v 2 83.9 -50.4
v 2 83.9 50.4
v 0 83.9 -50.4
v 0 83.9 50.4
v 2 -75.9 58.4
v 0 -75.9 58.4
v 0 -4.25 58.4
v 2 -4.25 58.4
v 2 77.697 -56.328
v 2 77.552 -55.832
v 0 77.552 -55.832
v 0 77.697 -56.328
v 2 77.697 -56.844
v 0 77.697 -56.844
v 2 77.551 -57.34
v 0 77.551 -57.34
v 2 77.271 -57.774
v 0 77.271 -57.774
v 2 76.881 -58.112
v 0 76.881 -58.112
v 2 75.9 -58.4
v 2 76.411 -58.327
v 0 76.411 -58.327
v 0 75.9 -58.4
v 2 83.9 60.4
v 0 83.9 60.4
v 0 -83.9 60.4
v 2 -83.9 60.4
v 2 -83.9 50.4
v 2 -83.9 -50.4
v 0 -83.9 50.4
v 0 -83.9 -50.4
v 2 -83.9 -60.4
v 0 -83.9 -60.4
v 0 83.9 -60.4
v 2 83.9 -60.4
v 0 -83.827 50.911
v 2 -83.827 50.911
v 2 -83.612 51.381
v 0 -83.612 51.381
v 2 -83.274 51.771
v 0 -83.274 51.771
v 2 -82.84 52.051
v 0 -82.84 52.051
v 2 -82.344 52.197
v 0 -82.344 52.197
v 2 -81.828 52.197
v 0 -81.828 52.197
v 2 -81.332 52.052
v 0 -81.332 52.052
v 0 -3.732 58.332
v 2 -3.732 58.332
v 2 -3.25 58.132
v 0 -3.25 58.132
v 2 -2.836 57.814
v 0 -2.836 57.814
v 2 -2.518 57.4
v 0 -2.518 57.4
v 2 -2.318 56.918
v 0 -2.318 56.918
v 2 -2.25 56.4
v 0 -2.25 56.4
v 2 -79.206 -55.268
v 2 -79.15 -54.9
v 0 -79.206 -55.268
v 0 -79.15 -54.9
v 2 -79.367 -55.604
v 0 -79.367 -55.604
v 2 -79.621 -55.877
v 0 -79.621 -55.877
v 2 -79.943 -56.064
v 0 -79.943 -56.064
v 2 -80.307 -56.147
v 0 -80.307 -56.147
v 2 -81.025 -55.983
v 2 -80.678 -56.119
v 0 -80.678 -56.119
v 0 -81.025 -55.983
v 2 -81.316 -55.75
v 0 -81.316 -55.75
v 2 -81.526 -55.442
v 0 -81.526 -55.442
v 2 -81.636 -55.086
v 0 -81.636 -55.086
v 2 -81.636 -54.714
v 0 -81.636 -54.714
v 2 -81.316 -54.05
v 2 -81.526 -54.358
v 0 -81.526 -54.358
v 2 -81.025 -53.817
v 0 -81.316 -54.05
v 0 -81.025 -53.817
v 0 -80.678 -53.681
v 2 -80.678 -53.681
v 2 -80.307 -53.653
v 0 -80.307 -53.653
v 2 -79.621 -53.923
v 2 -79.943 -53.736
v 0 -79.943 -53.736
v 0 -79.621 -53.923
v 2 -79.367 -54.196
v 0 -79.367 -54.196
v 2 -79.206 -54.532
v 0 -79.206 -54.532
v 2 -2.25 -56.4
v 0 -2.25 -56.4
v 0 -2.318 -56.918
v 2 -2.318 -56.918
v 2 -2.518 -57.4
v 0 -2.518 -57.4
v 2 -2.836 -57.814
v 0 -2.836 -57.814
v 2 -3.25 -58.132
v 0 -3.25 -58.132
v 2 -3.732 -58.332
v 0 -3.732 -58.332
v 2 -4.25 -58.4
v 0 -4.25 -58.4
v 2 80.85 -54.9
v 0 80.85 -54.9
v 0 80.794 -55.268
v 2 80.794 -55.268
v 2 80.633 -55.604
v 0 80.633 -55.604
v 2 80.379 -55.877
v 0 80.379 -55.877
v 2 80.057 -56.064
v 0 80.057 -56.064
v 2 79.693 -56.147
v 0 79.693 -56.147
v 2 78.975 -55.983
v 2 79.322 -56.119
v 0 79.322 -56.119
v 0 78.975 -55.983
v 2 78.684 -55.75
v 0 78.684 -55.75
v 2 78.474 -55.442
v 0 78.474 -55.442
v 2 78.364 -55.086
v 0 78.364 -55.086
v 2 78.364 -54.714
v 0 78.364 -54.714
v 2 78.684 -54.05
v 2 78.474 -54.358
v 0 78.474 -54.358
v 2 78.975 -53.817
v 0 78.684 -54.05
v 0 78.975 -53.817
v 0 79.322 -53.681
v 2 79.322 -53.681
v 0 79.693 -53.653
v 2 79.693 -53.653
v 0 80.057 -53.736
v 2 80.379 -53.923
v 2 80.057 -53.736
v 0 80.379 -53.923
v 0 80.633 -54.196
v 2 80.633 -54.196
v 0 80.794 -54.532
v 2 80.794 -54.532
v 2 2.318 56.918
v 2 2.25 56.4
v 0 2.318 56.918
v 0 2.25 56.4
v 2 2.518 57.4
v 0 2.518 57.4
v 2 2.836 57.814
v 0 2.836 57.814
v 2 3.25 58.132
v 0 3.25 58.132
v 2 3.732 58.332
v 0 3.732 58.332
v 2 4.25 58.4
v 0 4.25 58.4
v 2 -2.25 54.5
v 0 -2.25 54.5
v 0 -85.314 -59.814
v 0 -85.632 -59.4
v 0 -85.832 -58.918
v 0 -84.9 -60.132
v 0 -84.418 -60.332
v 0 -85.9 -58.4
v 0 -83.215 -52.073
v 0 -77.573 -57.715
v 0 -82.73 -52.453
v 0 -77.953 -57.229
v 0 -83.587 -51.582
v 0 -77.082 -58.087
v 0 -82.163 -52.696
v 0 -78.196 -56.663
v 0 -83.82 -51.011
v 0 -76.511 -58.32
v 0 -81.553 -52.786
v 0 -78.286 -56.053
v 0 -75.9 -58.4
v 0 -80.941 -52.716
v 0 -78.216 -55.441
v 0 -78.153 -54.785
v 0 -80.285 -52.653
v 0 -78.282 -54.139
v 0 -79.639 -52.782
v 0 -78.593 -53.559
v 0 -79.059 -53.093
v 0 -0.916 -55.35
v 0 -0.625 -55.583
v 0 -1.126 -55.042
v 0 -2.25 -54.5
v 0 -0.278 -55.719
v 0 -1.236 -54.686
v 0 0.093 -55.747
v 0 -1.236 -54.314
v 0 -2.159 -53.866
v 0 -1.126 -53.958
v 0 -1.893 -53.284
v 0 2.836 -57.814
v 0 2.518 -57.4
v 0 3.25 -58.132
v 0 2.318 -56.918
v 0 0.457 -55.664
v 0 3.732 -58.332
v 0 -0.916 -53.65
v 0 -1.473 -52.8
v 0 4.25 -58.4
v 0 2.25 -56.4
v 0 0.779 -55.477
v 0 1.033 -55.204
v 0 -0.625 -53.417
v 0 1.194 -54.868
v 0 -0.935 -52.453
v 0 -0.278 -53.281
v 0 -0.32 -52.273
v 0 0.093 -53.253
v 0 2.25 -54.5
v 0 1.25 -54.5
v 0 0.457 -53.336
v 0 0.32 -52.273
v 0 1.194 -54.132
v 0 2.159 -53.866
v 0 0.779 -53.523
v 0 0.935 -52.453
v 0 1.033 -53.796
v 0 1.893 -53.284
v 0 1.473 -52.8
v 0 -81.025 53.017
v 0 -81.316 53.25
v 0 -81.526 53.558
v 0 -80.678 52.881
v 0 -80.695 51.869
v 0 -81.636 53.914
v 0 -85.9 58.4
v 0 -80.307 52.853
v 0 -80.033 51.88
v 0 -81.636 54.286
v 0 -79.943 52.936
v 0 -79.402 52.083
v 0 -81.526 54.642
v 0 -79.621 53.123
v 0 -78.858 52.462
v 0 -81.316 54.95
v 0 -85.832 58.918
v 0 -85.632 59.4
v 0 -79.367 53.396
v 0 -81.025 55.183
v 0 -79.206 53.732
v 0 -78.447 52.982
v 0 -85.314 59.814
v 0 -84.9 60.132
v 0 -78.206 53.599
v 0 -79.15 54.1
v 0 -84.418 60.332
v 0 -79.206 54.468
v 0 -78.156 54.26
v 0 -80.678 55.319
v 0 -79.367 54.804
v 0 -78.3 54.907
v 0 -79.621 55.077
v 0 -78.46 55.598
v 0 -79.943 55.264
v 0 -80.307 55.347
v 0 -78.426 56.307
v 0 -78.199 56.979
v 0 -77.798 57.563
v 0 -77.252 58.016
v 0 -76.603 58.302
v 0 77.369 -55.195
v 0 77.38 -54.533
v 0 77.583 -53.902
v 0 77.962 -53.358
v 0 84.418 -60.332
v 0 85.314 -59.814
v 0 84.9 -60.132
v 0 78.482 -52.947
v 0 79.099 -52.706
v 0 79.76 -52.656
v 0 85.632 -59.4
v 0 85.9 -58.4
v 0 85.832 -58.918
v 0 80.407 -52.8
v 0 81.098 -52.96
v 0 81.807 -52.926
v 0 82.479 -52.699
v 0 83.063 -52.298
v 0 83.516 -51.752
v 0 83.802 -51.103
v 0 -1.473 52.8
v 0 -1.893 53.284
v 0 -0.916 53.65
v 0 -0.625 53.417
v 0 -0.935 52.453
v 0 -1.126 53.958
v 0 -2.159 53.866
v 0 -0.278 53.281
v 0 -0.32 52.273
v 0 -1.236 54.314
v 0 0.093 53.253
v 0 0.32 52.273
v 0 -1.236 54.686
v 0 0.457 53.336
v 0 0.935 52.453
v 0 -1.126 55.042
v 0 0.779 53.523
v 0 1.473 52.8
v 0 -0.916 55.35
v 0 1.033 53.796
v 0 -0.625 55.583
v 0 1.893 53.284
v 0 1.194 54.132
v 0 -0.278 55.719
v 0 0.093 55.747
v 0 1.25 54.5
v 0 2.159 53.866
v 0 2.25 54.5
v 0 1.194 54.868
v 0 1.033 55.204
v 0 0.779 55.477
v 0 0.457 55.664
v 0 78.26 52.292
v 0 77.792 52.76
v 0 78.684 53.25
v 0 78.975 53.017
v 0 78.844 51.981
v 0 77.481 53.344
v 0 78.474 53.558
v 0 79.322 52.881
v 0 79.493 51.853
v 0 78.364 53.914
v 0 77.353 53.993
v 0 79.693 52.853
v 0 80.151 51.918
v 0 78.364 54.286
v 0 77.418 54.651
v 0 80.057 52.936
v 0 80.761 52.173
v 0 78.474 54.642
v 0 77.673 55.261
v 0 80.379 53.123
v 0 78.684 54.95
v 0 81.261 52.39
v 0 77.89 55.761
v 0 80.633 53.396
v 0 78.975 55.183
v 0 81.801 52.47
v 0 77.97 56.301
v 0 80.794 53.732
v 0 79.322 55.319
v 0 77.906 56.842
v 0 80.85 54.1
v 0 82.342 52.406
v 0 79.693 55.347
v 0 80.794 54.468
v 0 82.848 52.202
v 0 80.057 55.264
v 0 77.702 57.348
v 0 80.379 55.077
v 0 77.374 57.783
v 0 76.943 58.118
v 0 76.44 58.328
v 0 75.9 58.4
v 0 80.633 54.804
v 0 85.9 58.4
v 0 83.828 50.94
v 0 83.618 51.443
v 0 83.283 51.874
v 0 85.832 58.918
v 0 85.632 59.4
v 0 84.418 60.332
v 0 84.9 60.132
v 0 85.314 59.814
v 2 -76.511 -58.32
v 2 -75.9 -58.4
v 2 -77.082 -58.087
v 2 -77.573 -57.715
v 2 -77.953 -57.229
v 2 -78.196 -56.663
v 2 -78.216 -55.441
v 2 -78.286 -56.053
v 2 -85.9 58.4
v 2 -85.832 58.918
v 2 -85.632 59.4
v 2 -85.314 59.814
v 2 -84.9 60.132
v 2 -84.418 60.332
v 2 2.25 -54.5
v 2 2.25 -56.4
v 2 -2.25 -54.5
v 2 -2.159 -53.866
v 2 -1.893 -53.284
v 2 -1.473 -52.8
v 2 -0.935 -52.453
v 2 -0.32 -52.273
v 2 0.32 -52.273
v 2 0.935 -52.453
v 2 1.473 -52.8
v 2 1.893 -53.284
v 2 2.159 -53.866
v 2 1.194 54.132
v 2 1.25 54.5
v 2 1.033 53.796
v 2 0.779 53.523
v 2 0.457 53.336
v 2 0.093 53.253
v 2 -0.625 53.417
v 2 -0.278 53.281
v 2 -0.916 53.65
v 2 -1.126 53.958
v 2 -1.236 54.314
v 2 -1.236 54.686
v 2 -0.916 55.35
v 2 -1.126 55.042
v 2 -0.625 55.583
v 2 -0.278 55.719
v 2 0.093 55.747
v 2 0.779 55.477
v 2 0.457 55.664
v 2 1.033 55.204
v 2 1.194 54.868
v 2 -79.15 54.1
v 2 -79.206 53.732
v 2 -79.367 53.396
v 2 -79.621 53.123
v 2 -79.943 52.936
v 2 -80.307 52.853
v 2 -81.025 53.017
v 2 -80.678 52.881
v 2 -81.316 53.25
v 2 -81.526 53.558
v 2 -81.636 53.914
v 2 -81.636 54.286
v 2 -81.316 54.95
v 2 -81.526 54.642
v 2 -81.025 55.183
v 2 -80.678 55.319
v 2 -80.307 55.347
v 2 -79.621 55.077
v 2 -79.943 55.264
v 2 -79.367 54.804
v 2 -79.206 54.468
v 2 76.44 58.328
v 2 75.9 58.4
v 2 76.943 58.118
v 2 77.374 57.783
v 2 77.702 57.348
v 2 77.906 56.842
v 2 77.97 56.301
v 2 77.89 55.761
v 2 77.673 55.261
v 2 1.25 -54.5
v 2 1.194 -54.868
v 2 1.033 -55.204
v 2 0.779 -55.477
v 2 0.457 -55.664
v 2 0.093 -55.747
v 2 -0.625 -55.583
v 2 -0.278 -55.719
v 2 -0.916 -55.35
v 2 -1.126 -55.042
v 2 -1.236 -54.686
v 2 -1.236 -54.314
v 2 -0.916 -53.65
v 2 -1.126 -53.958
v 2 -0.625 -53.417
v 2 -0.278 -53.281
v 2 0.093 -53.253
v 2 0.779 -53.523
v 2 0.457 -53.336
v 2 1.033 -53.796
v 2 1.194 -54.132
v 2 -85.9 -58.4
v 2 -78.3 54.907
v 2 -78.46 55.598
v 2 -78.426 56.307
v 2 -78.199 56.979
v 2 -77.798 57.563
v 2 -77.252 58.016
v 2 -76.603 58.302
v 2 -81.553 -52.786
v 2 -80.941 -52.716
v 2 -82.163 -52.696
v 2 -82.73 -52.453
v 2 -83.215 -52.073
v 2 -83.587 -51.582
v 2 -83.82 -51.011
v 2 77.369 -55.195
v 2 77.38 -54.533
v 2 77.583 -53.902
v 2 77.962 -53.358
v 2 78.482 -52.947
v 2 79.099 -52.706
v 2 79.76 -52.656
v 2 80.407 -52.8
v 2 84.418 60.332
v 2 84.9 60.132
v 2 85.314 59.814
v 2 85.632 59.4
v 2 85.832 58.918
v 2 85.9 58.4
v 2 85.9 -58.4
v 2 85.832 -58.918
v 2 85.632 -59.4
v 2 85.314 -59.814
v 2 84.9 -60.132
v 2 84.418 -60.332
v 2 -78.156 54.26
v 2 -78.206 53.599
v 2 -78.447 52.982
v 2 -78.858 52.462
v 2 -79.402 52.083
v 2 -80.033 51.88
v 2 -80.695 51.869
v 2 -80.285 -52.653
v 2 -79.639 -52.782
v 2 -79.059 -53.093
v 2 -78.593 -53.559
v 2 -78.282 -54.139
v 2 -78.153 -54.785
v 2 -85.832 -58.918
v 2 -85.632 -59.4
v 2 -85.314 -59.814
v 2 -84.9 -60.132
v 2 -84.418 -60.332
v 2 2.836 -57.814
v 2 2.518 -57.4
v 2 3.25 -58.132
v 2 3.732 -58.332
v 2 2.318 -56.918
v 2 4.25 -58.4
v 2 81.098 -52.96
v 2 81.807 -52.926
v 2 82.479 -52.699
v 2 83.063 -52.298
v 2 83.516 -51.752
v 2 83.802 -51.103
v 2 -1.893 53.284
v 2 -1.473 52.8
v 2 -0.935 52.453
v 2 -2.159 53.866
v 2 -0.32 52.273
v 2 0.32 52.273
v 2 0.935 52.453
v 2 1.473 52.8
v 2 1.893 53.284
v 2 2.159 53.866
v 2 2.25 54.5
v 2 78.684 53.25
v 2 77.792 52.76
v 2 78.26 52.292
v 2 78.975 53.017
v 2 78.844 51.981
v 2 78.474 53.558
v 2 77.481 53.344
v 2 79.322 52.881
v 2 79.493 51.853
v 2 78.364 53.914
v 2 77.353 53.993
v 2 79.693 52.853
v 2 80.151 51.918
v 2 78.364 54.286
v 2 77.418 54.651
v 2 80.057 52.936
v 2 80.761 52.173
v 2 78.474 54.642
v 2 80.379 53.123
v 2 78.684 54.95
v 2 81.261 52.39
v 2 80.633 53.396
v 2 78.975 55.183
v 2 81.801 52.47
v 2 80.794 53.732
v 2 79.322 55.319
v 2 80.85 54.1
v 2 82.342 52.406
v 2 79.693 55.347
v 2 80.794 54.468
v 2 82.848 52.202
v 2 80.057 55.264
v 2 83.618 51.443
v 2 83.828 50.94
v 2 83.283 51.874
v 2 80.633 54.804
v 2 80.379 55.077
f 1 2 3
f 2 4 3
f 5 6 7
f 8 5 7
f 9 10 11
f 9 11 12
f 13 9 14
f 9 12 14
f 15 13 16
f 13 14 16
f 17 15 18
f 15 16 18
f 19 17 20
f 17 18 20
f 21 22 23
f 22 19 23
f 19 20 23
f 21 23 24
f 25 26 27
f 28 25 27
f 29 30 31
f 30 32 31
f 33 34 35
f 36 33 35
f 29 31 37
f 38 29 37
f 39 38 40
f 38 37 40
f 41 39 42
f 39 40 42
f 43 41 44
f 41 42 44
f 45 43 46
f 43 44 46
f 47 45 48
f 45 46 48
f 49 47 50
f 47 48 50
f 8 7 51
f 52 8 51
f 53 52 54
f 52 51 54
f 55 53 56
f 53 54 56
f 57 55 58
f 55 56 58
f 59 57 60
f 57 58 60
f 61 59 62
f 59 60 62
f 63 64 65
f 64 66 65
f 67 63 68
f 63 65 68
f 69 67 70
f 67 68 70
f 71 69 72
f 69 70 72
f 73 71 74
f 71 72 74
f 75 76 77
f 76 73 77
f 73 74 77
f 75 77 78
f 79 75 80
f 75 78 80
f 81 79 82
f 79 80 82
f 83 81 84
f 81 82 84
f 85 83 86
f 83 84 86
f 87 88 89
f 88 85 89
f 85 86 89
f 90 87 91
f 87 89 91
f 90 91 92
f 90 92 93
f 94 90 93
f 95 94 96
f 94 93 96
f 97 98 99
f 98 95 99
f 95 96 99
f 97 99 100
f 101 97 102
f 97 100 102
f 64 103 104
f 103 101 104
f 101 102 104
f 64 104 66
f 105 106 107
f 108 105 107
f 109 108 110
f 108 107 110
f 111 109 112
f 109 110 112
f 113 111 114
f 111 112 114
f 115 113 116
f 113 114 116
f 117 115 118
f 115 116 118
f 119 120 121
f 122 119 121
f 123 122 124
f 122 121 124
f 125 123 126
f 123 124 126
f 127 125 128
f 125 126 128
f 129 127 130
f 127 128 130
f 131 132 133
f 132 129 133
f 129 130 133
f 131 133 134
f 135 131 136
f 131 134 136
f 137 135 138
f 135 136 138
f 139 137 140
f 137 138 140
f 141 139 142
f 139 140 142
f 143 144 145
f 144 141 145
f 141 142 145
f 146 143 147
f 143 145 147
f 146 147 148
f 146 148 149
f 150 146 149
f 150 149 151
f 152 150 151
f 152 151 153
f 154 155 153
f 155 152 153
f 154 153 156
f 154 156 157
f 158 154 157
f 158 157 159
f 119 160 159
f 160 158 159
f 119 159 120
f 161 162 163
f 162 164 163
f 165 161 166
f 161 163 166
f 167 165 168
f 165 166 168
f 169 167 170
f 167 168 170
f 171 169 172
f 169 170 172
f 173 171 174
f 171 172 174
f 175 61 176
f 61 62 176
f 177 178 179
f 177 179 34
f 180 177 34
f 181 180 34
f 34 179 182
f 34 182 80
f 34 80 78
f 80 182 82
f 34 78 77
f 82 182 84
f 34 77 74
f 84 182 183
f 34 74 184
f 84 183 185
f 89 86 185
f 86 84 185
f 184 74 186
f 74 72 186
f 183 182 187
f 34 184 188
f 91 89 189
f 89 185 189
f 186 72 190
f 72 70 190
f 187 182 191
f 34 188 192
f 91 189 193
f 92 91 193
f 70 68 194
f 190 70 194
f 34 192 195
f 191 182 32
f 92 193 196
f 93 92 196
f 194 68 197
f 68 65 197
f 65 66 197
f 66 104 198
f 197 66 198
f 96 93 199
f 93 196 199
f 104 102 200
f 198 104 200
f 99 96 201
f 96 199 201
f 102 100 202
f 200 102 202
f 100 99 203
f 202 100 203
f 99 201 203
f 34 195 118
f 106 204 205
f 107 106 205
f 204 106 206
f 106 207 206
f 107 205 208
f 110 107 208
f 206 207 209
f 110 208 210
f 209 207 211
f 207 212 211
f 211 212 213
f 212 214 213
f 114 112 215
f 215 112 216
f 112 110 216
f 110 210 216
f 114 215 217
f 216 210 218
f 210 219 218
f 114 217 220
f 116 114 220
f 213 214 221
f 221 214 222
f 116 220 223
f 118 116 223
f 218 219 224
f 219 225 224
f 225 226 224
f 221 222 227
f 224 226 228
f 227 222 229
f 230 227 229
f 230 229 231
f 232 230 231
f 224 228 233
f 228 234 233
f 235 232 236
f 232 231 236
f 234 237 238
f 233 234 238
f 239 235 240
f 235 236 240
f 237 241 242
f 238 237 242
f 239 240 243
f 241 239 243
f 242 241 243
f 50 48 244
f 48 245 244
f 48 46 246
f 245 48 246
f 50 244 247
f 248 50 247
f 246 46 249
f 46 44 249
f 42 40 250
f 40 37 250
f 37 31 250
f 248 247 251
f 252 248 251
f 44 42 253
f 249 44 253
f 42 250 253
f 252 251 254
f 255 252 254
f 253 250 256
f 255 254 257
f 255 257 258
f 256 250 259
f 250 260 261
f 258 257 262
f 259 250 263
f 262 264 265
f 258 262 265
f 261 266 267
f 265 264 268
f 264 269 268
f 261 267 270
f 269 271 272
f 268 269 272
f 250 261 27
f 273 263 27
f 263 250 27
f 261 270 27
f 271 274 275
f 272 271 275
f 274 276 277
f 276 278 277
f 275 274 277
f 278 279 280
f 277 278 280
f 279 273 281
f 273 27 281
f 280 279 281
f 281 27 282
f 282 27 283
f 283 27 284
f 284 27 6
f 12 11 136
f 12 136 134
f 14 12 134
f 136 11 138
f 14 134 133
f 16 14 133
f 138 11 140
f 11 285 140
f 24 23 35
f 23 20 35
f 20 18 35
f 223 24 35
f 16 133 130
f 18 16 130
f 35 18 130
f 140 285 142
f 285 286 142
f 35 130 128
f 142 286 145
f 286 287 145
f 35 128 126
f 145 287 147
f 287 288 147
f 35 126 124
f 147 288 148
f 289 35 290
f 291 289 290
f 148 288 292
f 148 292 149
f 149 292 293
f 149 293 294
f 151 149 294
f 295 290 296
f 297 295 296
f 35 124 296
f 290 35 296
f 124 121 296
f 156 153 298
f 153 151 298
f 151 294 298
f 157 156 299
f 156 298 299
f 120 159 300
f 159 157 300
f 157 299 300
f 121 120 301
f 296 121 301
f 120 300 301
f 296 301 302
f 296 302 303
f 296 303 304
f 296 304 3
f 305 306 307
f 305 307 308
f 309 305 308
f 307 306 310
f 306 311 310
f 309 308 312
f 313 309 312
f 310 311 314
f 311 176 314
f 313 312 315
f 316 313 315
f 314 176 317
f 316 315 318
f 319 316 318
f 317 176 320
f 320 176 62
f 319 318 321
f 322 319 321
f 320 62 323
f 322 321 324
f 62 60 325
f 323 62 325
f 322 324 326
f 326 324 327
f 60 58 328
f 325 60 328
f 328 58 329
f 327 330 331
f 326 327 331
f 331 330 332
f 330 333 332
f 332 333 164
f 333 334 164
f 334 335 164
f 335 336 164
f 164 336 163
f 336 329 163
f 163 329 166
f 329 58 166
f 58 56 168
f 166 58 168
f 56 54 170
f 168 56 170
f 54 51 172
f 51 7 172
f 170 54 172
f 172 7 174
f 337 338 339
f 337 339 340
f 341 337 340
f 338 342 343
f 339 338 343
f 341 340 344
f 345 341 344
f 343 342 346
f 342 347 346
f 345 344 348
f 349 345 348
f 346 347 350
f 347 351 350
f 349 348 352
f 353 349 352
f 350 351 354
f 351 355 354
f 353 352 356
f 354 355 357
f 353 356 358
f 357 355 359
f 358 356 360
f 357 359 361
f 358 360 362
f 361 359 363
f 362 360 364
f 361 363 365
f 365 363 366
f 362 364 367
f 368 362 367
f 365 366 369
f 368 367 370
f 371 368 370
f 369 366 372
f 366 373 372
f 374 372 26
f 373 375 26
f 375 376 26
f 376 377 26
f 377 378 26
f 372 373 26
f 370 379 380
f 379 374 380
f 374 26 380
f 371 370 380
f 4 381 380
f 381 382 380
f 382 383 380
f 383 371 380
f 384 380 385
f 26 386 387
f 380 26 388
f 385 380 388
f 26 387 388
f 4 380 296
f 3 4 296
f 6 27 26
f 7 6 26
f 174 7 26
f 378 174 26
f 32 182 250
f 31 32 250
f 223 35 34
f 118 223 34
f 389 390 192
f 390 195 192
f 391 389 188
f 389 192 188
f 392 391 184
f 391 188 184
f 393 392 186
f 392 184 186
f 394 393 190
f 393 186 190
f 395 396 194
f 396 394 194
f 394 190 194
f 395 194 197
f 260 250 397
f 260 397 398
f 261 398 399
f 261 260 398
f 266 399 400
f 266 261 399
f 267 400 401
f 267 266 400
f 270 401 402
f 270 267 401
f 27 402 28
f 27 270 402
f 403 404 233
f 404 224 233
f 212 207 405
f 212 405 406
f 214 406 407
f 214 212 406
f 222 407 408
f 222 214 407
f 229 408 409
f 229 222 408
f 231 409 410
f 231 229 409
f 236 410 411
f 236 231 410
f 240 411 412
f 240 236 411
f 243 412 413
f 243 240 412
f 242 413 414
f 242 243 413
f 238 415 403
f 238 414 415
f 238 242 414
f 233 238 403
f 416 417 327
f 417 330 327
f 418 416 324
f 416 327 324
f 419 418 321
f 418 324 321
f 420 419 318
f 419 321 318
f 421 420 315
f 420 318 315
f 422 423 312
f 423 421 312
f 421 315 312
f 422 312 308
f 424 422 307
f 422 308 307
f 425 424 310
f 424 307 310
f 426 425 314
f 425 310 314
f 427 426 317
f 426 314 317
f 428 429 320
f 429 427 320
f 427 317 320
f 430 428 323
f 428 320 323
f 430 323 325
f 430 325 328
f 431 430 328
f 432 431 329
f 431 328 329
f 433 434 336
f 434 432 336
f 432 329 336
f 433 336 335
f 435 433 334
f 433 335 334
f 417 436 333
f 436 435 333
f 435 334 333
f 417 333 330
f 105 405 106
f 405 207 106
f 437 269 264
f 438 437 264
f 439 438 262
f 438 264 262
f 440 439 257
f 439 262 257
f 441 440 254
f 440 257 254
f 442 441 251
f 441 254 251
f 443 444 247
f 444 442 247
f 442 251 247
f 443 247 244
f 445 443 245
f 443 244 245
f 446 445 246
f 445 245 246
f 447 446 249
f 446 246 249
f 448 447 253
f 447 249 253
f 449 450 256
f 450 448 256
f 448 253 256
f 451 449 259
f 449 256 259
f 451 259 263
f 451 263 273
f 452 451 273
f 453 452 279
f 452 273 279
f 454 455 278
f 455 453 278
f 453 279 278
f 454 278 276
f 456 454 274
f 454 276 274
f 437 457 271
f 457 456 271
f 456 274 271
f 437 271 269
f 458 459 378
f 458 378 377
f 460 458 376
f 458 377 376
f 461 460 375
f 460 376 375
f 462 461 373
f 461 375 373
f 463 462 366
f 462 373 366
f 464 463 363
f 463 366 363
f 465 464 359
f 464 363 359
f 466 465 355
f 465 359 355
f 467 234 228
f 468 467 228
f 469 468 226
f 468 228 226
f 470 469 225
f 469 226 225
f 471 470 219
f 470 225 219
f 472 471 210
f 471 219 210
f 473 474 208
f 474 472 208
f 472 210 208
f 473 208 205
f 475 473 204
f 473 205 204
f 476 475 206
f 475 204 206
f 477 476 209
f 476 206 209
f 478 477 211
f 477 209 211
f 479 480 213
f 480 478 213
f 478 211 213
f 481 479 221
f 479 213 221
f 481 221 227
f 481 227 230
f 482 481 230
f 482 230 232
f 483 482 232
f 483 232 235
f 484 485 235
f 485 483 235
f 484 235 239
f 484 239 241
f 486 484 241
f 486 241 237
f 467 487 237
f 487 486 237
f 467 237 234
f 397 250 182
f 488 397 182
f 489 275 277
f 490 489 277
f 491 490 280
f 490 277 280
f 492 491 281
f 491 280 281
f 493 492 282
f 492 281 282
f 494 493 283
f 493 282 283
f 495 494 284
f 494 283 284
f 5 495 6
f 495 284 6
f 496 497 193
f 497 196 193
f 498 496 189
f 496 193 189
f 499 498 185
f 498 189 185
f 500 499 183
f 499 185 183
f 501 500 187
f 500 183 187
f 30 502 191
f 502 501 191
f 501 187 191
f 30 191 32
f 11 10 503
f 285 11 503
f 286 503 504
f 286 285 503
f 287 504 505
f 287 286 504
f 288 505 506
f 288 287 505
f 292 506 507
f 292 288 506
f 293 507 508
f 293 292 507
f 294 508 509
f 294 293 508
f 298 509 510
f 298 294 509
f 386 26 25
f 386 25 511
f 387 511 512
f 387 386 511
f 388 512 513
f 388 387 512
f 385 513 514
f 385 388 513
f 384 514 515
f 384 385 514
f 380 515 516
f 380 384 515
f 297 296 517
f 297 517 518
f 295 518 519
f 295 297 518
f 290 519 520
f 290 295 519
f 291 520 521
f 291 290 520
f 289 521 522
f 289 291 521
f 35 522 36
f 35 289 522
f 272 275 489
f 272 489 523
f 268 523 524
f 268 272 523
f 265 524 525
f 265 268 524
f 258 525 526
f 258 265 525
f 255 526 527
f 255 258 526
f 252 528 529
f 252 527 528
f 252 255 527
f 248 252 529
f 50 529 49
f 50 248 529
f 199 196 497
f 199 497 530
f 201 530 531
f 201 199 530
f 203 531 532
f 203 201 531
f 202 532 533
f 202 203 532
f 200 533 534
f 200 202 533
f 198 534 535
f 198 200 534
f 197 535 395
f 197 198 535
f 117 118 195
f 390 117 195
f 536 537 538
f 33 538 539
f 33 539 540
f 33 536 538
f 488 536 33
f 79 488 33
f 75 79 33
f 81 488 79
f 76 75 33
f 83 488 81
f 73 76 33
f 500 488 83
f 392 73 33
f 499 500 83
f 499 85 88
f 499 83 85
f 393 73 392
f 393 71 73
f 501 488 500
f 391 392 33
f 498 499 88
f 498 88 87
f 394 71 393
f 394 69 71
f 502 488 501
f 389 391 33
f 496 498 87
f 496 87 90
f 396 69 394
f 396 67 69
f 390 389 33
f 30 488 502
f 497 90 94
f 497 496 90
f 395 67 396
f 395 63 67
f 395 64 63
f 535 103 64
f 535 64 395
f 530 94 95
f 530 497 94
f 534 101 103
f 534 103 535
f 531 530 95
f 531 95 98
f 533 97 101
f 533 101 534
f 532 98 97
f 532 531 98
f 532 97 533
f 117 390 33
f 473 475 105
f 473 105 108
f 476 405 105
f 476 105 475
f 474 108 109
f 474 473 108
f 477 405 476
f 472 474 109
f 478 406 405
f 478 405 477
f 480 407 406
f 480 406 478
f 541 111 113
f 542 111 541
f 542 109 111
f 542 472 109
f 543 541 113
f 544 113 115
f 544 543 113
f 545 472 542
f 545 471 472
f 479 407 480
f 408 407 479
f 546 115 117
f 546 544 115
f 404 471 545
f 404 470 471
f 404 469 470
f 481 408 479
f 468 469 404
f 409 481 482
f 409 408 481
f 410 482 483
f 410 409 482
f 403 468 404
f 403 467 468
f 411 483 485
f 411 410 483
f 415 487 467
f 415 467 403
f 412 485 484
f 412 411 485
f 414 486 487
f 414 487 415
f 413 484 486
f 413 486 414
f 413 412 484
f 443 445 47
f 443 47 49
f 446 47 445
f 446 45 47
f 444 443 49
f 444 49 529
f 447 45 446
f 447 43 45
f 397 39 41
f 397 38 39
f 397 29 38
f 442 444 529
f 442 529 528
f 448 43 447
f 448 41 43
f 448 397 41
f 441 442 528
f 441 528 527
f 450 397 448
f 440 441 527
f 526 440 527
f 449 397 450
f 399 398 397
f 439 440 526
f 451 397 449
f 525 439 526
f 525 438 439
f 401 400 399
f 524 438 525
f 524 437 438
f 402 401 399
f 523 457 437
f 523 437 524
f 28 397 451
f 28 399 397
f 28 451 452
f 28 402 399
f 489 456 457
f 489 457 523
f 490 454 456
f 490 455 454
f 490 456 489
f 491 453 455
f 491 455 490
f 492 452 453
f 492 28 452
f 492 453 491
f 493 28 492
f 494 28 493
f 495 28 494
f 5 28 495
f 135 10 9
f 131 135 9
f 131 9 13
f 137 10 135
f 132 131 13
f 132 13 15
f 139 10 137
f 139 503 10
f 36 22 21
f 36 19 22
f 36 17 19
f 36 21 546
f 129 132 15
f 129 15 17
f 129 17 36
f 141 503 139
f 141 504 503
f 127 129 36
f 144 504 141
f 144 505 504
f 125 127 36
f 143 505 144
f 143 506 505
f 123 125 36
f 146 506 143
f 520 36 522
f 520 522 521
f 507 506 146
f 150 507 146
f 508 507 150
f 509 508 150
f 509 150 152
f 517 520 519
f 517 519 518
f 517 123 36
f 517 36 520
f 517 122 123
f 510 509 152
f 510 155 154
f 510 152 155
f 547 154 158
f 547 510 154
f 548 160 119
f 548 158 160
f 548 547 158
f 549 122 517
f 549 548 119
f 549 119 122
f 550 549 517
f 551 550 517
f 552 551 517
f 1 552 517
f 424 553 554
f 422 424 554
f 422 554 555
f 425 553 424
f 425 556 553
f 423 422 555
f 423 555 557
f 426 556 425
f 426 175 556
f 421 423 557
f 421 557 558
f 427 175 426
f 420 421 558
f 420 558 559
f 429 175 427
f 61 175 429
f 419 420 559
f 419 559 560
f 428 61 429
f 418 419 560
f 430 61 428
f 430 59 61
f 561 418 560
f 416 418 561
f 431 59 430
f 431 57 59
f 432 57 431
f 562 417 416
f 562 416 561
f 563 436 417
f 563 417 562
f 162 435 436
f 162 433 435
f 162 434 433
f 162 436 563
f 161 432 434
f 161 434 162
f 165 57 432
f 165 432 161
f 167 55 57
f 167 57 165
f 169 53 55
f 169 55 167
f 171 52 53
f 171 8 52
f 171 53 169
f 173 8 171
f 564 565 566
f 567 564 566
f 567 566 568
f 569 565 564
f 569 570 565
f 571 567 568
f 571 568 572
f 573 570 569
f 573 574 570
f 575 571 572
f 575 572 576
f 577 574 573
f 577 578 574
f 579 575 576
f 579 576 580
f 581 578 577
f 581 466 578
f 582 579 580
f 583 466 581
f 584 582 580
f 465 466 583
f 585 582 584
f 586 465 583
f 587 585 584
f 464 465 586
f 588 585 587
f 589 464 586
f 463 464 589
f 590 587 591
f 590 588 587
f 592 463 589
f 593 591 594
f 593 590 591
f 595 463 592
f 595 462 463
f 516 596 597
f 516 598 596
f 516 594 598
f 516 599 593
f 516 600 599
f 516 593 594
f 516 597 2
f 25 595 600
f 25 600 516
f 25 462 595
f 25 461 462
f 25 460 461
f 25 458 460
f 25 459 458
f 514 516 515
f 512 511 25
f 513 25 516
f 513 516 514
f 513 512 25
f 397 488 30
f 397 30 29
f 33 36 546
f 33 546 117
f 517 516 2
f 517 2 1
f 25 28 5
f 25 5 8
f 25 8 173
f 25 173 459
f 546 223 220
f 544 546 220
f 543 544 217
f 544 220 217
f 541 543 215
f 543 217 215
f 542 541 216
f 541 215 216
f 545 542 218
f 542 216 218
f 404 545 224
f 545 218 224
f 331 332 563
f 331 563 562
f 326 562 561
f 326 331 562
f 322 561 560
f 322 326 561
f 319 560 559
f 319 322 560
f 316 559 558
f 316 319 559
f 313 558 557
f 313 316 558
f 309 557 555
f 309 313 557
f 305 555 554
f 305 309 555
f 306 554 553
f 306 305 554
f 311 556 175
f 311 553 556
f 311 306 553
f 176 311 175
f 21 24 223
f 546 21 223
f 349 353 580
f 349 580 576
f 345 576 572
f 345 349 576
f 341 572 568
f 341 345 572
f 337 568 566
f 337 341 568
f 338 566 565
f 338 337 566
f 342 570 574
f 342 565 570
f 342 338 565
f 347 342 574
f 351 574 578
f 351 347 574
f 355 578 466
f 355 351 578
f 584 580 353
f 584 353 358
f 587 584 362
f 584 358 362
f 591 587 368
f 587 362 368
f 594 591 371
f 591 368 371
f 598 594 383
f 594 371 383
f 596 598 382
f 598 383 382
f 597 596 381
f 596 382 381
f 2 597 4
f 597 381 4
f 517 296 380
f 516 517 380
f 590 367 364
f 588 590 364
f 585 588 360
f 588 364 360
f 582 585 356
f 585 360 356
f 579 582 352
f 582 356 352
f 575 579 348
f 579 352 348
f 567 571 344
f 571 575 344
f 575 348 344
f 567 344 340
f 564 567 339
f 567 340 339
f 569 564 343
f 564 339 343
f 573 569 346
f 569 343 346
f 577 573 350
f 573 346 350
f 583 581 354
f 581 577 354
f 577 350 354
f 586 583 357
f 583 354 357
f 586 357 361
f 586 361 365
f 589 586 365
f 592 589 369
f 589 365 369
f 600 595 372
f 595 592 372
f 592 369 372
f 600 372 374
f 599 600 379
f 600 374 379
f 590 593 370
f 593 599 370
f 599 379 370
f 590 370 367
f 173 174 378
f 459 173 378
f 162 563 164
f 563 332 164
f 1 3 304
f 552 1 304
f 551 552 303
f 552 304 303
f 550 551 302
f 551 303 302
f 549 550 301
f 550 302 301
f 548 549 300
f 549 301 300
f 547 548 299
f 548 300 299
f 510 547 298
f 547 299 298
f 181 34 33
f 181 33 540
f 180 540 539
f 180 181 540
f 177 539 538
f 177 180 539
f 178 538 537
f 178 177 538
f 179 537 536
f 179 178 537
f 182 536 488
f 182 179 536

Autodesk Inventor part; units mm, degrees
ref_plane "YZ Plane" through (0, 0, 0) normal (1, 0, 0) x (0, 1, 0)
ref_plane "XZ Plane" through (0, 0, 0) normal (0, 1, 0) x (-1, 0, 0)
ref_plane "XY Plane" through (0, 0, 0) normal (0, 0, 1) x (1, 0, 0)
sketch "Sketch1" plane through (0, 0, 0) normal (1, 0, 0) x (0, 1, 0)
  line L0 (-4.25, -58.4) -> (-75.9, -58.4)
  arc A0 (-78.2159, -55.4407) -> (-75.9, -58.4) centre (-75.9, -56.0141) ccw
  arc A1 (-78.2159, -55.4407) -> (-80.9407, -52.7159) centre (-80.4, -54.9) ccw
  arc A2 (-83.9, -50.4) -> (-80.9407, -52.7159) centre (-81.5141, -50.4) ccw
  line L1 (-83.9, -50.4) -> (-83.9, 50.4)
  arc A3 (-81.3323, 52.0522) -> (-83.9, 50.4) centre (-82.0846, 50.4) ccw
  arc A4 (-81.3323, 52.0522) -> (-78.2997, 54.9071) centre (-80.4, 54.1) ccw
  arc A5 (-75.9, 58.4) -> (-78.2997, 54.9071) centre (-75.9, 55.8292) ccw
  line L2 (-75.9, 58.4) -> (-4.25, 58.4)
  arc A6 (-2.25, 56.4) -> (-4.25, 58.4) centre (-4.25, 56.4) ccw
  line L3 (-2.25, 56.4) -> (-2.25, 54.5)
  arc A7 (-2.25, 54.5) -> (2.25, 54.5) centre (0, 54.5) ccw
  line L4 (2.25, 54.5) -> (2.25, 56.4)
  arc A8 (4.25, 58.4) -> (2.25, 56.4) centre (4.25, 56.4) ccw
  line L5 (4.25, 58.4) -> (75.9, 58.4)
  arc A9 (77.6729, 55.2614) -> (75.9, 58.4) centre (75.9, 56.33) ccw
  arc A10 (77.6729, 55.2614) -> (80.7614, 52.1729) centre (79.6, 54.1) ccw
  arc A11 (83.9, 50.4) -> (80.7614, 52.1729) centre (81.83, 50.4) ccw
  line L6 (83.9, 50.4) -> (83.9, -50.4)
  arc A12 (80.4071, -52.7997) -> (83.9, -50.4) centre (81.3292, -50.4) ccw
  arc A13 (80.4071, -52.7997) -> (77.5522, -55.8323) centre (79.6, -54.9) ccw
  arc A14 (75.9, -58.4) -> (77.5522, -55.8323) centre (75.9, -56.5846) ccw
  line L7 (75.9, -58.4) -> (4.25, -58.4)
  arc A15 (2.25, -56.4) -> (4.25, -58.4) centre (4.25, -56.4) ccw
  line L8 (2.25, -56.4) -> (2.25, -54.5)
  arc A16 (2.25, -54.5) -> (-2.25, -54.5) centre (0, -54.5) ccw
  line L9 (-2.25, -54.5) -> (-2.25, -56.4)
  arc A17 (-4.25, -58.4) -> (-2.25, -56.4) centre (-4.25, -56.4) ccw
  circle A18 centre (-80.4, -54.9) radius 1.25
  circle A19 centre (-80.4, 54.1) radius 1.25
  circle A20 centre (0, -54.5) radius 1.25
  circle A21 centre (79.6, -54.9) radius 1.25
  circle A22 centre (0, 54.5) radius 1.25
  circle A23 centre (79.6, 54.1) radius 1.25
  arc A24 (-85.9, -58.4) -> (-83.9, -60.4) centre (-83.9, -58.4) ccw
  line L10 (-83.9, -60.4) -> (83.9, -60.4)
  arc A25 (83.9, -60.4) -> (85.9, -58.4) centre (83.9, -58.4) ccw
  line L11 (85.9, -58.4) -> (85.9, 58.4)
  arc A26 (85.9, 58.4) -> (83.9, 60.4) centre (83.9, 58.4) ccw
  line L12 (83.9, 60.4) -> (-83.9, 60.4)
  arc A27 (-83.9, 60.4) -> (-85.9, 58.4) centre (-83.9, 58.4) ccw
  line L13 (-85.9, 58.4) -> (-85.9, -58.4)
  point P0 (0, 0)
  point P1 (0, 0)
extrude "Extrusion1" add sketch "Sketch1" along normal blind 2
properties part number "gasket"
